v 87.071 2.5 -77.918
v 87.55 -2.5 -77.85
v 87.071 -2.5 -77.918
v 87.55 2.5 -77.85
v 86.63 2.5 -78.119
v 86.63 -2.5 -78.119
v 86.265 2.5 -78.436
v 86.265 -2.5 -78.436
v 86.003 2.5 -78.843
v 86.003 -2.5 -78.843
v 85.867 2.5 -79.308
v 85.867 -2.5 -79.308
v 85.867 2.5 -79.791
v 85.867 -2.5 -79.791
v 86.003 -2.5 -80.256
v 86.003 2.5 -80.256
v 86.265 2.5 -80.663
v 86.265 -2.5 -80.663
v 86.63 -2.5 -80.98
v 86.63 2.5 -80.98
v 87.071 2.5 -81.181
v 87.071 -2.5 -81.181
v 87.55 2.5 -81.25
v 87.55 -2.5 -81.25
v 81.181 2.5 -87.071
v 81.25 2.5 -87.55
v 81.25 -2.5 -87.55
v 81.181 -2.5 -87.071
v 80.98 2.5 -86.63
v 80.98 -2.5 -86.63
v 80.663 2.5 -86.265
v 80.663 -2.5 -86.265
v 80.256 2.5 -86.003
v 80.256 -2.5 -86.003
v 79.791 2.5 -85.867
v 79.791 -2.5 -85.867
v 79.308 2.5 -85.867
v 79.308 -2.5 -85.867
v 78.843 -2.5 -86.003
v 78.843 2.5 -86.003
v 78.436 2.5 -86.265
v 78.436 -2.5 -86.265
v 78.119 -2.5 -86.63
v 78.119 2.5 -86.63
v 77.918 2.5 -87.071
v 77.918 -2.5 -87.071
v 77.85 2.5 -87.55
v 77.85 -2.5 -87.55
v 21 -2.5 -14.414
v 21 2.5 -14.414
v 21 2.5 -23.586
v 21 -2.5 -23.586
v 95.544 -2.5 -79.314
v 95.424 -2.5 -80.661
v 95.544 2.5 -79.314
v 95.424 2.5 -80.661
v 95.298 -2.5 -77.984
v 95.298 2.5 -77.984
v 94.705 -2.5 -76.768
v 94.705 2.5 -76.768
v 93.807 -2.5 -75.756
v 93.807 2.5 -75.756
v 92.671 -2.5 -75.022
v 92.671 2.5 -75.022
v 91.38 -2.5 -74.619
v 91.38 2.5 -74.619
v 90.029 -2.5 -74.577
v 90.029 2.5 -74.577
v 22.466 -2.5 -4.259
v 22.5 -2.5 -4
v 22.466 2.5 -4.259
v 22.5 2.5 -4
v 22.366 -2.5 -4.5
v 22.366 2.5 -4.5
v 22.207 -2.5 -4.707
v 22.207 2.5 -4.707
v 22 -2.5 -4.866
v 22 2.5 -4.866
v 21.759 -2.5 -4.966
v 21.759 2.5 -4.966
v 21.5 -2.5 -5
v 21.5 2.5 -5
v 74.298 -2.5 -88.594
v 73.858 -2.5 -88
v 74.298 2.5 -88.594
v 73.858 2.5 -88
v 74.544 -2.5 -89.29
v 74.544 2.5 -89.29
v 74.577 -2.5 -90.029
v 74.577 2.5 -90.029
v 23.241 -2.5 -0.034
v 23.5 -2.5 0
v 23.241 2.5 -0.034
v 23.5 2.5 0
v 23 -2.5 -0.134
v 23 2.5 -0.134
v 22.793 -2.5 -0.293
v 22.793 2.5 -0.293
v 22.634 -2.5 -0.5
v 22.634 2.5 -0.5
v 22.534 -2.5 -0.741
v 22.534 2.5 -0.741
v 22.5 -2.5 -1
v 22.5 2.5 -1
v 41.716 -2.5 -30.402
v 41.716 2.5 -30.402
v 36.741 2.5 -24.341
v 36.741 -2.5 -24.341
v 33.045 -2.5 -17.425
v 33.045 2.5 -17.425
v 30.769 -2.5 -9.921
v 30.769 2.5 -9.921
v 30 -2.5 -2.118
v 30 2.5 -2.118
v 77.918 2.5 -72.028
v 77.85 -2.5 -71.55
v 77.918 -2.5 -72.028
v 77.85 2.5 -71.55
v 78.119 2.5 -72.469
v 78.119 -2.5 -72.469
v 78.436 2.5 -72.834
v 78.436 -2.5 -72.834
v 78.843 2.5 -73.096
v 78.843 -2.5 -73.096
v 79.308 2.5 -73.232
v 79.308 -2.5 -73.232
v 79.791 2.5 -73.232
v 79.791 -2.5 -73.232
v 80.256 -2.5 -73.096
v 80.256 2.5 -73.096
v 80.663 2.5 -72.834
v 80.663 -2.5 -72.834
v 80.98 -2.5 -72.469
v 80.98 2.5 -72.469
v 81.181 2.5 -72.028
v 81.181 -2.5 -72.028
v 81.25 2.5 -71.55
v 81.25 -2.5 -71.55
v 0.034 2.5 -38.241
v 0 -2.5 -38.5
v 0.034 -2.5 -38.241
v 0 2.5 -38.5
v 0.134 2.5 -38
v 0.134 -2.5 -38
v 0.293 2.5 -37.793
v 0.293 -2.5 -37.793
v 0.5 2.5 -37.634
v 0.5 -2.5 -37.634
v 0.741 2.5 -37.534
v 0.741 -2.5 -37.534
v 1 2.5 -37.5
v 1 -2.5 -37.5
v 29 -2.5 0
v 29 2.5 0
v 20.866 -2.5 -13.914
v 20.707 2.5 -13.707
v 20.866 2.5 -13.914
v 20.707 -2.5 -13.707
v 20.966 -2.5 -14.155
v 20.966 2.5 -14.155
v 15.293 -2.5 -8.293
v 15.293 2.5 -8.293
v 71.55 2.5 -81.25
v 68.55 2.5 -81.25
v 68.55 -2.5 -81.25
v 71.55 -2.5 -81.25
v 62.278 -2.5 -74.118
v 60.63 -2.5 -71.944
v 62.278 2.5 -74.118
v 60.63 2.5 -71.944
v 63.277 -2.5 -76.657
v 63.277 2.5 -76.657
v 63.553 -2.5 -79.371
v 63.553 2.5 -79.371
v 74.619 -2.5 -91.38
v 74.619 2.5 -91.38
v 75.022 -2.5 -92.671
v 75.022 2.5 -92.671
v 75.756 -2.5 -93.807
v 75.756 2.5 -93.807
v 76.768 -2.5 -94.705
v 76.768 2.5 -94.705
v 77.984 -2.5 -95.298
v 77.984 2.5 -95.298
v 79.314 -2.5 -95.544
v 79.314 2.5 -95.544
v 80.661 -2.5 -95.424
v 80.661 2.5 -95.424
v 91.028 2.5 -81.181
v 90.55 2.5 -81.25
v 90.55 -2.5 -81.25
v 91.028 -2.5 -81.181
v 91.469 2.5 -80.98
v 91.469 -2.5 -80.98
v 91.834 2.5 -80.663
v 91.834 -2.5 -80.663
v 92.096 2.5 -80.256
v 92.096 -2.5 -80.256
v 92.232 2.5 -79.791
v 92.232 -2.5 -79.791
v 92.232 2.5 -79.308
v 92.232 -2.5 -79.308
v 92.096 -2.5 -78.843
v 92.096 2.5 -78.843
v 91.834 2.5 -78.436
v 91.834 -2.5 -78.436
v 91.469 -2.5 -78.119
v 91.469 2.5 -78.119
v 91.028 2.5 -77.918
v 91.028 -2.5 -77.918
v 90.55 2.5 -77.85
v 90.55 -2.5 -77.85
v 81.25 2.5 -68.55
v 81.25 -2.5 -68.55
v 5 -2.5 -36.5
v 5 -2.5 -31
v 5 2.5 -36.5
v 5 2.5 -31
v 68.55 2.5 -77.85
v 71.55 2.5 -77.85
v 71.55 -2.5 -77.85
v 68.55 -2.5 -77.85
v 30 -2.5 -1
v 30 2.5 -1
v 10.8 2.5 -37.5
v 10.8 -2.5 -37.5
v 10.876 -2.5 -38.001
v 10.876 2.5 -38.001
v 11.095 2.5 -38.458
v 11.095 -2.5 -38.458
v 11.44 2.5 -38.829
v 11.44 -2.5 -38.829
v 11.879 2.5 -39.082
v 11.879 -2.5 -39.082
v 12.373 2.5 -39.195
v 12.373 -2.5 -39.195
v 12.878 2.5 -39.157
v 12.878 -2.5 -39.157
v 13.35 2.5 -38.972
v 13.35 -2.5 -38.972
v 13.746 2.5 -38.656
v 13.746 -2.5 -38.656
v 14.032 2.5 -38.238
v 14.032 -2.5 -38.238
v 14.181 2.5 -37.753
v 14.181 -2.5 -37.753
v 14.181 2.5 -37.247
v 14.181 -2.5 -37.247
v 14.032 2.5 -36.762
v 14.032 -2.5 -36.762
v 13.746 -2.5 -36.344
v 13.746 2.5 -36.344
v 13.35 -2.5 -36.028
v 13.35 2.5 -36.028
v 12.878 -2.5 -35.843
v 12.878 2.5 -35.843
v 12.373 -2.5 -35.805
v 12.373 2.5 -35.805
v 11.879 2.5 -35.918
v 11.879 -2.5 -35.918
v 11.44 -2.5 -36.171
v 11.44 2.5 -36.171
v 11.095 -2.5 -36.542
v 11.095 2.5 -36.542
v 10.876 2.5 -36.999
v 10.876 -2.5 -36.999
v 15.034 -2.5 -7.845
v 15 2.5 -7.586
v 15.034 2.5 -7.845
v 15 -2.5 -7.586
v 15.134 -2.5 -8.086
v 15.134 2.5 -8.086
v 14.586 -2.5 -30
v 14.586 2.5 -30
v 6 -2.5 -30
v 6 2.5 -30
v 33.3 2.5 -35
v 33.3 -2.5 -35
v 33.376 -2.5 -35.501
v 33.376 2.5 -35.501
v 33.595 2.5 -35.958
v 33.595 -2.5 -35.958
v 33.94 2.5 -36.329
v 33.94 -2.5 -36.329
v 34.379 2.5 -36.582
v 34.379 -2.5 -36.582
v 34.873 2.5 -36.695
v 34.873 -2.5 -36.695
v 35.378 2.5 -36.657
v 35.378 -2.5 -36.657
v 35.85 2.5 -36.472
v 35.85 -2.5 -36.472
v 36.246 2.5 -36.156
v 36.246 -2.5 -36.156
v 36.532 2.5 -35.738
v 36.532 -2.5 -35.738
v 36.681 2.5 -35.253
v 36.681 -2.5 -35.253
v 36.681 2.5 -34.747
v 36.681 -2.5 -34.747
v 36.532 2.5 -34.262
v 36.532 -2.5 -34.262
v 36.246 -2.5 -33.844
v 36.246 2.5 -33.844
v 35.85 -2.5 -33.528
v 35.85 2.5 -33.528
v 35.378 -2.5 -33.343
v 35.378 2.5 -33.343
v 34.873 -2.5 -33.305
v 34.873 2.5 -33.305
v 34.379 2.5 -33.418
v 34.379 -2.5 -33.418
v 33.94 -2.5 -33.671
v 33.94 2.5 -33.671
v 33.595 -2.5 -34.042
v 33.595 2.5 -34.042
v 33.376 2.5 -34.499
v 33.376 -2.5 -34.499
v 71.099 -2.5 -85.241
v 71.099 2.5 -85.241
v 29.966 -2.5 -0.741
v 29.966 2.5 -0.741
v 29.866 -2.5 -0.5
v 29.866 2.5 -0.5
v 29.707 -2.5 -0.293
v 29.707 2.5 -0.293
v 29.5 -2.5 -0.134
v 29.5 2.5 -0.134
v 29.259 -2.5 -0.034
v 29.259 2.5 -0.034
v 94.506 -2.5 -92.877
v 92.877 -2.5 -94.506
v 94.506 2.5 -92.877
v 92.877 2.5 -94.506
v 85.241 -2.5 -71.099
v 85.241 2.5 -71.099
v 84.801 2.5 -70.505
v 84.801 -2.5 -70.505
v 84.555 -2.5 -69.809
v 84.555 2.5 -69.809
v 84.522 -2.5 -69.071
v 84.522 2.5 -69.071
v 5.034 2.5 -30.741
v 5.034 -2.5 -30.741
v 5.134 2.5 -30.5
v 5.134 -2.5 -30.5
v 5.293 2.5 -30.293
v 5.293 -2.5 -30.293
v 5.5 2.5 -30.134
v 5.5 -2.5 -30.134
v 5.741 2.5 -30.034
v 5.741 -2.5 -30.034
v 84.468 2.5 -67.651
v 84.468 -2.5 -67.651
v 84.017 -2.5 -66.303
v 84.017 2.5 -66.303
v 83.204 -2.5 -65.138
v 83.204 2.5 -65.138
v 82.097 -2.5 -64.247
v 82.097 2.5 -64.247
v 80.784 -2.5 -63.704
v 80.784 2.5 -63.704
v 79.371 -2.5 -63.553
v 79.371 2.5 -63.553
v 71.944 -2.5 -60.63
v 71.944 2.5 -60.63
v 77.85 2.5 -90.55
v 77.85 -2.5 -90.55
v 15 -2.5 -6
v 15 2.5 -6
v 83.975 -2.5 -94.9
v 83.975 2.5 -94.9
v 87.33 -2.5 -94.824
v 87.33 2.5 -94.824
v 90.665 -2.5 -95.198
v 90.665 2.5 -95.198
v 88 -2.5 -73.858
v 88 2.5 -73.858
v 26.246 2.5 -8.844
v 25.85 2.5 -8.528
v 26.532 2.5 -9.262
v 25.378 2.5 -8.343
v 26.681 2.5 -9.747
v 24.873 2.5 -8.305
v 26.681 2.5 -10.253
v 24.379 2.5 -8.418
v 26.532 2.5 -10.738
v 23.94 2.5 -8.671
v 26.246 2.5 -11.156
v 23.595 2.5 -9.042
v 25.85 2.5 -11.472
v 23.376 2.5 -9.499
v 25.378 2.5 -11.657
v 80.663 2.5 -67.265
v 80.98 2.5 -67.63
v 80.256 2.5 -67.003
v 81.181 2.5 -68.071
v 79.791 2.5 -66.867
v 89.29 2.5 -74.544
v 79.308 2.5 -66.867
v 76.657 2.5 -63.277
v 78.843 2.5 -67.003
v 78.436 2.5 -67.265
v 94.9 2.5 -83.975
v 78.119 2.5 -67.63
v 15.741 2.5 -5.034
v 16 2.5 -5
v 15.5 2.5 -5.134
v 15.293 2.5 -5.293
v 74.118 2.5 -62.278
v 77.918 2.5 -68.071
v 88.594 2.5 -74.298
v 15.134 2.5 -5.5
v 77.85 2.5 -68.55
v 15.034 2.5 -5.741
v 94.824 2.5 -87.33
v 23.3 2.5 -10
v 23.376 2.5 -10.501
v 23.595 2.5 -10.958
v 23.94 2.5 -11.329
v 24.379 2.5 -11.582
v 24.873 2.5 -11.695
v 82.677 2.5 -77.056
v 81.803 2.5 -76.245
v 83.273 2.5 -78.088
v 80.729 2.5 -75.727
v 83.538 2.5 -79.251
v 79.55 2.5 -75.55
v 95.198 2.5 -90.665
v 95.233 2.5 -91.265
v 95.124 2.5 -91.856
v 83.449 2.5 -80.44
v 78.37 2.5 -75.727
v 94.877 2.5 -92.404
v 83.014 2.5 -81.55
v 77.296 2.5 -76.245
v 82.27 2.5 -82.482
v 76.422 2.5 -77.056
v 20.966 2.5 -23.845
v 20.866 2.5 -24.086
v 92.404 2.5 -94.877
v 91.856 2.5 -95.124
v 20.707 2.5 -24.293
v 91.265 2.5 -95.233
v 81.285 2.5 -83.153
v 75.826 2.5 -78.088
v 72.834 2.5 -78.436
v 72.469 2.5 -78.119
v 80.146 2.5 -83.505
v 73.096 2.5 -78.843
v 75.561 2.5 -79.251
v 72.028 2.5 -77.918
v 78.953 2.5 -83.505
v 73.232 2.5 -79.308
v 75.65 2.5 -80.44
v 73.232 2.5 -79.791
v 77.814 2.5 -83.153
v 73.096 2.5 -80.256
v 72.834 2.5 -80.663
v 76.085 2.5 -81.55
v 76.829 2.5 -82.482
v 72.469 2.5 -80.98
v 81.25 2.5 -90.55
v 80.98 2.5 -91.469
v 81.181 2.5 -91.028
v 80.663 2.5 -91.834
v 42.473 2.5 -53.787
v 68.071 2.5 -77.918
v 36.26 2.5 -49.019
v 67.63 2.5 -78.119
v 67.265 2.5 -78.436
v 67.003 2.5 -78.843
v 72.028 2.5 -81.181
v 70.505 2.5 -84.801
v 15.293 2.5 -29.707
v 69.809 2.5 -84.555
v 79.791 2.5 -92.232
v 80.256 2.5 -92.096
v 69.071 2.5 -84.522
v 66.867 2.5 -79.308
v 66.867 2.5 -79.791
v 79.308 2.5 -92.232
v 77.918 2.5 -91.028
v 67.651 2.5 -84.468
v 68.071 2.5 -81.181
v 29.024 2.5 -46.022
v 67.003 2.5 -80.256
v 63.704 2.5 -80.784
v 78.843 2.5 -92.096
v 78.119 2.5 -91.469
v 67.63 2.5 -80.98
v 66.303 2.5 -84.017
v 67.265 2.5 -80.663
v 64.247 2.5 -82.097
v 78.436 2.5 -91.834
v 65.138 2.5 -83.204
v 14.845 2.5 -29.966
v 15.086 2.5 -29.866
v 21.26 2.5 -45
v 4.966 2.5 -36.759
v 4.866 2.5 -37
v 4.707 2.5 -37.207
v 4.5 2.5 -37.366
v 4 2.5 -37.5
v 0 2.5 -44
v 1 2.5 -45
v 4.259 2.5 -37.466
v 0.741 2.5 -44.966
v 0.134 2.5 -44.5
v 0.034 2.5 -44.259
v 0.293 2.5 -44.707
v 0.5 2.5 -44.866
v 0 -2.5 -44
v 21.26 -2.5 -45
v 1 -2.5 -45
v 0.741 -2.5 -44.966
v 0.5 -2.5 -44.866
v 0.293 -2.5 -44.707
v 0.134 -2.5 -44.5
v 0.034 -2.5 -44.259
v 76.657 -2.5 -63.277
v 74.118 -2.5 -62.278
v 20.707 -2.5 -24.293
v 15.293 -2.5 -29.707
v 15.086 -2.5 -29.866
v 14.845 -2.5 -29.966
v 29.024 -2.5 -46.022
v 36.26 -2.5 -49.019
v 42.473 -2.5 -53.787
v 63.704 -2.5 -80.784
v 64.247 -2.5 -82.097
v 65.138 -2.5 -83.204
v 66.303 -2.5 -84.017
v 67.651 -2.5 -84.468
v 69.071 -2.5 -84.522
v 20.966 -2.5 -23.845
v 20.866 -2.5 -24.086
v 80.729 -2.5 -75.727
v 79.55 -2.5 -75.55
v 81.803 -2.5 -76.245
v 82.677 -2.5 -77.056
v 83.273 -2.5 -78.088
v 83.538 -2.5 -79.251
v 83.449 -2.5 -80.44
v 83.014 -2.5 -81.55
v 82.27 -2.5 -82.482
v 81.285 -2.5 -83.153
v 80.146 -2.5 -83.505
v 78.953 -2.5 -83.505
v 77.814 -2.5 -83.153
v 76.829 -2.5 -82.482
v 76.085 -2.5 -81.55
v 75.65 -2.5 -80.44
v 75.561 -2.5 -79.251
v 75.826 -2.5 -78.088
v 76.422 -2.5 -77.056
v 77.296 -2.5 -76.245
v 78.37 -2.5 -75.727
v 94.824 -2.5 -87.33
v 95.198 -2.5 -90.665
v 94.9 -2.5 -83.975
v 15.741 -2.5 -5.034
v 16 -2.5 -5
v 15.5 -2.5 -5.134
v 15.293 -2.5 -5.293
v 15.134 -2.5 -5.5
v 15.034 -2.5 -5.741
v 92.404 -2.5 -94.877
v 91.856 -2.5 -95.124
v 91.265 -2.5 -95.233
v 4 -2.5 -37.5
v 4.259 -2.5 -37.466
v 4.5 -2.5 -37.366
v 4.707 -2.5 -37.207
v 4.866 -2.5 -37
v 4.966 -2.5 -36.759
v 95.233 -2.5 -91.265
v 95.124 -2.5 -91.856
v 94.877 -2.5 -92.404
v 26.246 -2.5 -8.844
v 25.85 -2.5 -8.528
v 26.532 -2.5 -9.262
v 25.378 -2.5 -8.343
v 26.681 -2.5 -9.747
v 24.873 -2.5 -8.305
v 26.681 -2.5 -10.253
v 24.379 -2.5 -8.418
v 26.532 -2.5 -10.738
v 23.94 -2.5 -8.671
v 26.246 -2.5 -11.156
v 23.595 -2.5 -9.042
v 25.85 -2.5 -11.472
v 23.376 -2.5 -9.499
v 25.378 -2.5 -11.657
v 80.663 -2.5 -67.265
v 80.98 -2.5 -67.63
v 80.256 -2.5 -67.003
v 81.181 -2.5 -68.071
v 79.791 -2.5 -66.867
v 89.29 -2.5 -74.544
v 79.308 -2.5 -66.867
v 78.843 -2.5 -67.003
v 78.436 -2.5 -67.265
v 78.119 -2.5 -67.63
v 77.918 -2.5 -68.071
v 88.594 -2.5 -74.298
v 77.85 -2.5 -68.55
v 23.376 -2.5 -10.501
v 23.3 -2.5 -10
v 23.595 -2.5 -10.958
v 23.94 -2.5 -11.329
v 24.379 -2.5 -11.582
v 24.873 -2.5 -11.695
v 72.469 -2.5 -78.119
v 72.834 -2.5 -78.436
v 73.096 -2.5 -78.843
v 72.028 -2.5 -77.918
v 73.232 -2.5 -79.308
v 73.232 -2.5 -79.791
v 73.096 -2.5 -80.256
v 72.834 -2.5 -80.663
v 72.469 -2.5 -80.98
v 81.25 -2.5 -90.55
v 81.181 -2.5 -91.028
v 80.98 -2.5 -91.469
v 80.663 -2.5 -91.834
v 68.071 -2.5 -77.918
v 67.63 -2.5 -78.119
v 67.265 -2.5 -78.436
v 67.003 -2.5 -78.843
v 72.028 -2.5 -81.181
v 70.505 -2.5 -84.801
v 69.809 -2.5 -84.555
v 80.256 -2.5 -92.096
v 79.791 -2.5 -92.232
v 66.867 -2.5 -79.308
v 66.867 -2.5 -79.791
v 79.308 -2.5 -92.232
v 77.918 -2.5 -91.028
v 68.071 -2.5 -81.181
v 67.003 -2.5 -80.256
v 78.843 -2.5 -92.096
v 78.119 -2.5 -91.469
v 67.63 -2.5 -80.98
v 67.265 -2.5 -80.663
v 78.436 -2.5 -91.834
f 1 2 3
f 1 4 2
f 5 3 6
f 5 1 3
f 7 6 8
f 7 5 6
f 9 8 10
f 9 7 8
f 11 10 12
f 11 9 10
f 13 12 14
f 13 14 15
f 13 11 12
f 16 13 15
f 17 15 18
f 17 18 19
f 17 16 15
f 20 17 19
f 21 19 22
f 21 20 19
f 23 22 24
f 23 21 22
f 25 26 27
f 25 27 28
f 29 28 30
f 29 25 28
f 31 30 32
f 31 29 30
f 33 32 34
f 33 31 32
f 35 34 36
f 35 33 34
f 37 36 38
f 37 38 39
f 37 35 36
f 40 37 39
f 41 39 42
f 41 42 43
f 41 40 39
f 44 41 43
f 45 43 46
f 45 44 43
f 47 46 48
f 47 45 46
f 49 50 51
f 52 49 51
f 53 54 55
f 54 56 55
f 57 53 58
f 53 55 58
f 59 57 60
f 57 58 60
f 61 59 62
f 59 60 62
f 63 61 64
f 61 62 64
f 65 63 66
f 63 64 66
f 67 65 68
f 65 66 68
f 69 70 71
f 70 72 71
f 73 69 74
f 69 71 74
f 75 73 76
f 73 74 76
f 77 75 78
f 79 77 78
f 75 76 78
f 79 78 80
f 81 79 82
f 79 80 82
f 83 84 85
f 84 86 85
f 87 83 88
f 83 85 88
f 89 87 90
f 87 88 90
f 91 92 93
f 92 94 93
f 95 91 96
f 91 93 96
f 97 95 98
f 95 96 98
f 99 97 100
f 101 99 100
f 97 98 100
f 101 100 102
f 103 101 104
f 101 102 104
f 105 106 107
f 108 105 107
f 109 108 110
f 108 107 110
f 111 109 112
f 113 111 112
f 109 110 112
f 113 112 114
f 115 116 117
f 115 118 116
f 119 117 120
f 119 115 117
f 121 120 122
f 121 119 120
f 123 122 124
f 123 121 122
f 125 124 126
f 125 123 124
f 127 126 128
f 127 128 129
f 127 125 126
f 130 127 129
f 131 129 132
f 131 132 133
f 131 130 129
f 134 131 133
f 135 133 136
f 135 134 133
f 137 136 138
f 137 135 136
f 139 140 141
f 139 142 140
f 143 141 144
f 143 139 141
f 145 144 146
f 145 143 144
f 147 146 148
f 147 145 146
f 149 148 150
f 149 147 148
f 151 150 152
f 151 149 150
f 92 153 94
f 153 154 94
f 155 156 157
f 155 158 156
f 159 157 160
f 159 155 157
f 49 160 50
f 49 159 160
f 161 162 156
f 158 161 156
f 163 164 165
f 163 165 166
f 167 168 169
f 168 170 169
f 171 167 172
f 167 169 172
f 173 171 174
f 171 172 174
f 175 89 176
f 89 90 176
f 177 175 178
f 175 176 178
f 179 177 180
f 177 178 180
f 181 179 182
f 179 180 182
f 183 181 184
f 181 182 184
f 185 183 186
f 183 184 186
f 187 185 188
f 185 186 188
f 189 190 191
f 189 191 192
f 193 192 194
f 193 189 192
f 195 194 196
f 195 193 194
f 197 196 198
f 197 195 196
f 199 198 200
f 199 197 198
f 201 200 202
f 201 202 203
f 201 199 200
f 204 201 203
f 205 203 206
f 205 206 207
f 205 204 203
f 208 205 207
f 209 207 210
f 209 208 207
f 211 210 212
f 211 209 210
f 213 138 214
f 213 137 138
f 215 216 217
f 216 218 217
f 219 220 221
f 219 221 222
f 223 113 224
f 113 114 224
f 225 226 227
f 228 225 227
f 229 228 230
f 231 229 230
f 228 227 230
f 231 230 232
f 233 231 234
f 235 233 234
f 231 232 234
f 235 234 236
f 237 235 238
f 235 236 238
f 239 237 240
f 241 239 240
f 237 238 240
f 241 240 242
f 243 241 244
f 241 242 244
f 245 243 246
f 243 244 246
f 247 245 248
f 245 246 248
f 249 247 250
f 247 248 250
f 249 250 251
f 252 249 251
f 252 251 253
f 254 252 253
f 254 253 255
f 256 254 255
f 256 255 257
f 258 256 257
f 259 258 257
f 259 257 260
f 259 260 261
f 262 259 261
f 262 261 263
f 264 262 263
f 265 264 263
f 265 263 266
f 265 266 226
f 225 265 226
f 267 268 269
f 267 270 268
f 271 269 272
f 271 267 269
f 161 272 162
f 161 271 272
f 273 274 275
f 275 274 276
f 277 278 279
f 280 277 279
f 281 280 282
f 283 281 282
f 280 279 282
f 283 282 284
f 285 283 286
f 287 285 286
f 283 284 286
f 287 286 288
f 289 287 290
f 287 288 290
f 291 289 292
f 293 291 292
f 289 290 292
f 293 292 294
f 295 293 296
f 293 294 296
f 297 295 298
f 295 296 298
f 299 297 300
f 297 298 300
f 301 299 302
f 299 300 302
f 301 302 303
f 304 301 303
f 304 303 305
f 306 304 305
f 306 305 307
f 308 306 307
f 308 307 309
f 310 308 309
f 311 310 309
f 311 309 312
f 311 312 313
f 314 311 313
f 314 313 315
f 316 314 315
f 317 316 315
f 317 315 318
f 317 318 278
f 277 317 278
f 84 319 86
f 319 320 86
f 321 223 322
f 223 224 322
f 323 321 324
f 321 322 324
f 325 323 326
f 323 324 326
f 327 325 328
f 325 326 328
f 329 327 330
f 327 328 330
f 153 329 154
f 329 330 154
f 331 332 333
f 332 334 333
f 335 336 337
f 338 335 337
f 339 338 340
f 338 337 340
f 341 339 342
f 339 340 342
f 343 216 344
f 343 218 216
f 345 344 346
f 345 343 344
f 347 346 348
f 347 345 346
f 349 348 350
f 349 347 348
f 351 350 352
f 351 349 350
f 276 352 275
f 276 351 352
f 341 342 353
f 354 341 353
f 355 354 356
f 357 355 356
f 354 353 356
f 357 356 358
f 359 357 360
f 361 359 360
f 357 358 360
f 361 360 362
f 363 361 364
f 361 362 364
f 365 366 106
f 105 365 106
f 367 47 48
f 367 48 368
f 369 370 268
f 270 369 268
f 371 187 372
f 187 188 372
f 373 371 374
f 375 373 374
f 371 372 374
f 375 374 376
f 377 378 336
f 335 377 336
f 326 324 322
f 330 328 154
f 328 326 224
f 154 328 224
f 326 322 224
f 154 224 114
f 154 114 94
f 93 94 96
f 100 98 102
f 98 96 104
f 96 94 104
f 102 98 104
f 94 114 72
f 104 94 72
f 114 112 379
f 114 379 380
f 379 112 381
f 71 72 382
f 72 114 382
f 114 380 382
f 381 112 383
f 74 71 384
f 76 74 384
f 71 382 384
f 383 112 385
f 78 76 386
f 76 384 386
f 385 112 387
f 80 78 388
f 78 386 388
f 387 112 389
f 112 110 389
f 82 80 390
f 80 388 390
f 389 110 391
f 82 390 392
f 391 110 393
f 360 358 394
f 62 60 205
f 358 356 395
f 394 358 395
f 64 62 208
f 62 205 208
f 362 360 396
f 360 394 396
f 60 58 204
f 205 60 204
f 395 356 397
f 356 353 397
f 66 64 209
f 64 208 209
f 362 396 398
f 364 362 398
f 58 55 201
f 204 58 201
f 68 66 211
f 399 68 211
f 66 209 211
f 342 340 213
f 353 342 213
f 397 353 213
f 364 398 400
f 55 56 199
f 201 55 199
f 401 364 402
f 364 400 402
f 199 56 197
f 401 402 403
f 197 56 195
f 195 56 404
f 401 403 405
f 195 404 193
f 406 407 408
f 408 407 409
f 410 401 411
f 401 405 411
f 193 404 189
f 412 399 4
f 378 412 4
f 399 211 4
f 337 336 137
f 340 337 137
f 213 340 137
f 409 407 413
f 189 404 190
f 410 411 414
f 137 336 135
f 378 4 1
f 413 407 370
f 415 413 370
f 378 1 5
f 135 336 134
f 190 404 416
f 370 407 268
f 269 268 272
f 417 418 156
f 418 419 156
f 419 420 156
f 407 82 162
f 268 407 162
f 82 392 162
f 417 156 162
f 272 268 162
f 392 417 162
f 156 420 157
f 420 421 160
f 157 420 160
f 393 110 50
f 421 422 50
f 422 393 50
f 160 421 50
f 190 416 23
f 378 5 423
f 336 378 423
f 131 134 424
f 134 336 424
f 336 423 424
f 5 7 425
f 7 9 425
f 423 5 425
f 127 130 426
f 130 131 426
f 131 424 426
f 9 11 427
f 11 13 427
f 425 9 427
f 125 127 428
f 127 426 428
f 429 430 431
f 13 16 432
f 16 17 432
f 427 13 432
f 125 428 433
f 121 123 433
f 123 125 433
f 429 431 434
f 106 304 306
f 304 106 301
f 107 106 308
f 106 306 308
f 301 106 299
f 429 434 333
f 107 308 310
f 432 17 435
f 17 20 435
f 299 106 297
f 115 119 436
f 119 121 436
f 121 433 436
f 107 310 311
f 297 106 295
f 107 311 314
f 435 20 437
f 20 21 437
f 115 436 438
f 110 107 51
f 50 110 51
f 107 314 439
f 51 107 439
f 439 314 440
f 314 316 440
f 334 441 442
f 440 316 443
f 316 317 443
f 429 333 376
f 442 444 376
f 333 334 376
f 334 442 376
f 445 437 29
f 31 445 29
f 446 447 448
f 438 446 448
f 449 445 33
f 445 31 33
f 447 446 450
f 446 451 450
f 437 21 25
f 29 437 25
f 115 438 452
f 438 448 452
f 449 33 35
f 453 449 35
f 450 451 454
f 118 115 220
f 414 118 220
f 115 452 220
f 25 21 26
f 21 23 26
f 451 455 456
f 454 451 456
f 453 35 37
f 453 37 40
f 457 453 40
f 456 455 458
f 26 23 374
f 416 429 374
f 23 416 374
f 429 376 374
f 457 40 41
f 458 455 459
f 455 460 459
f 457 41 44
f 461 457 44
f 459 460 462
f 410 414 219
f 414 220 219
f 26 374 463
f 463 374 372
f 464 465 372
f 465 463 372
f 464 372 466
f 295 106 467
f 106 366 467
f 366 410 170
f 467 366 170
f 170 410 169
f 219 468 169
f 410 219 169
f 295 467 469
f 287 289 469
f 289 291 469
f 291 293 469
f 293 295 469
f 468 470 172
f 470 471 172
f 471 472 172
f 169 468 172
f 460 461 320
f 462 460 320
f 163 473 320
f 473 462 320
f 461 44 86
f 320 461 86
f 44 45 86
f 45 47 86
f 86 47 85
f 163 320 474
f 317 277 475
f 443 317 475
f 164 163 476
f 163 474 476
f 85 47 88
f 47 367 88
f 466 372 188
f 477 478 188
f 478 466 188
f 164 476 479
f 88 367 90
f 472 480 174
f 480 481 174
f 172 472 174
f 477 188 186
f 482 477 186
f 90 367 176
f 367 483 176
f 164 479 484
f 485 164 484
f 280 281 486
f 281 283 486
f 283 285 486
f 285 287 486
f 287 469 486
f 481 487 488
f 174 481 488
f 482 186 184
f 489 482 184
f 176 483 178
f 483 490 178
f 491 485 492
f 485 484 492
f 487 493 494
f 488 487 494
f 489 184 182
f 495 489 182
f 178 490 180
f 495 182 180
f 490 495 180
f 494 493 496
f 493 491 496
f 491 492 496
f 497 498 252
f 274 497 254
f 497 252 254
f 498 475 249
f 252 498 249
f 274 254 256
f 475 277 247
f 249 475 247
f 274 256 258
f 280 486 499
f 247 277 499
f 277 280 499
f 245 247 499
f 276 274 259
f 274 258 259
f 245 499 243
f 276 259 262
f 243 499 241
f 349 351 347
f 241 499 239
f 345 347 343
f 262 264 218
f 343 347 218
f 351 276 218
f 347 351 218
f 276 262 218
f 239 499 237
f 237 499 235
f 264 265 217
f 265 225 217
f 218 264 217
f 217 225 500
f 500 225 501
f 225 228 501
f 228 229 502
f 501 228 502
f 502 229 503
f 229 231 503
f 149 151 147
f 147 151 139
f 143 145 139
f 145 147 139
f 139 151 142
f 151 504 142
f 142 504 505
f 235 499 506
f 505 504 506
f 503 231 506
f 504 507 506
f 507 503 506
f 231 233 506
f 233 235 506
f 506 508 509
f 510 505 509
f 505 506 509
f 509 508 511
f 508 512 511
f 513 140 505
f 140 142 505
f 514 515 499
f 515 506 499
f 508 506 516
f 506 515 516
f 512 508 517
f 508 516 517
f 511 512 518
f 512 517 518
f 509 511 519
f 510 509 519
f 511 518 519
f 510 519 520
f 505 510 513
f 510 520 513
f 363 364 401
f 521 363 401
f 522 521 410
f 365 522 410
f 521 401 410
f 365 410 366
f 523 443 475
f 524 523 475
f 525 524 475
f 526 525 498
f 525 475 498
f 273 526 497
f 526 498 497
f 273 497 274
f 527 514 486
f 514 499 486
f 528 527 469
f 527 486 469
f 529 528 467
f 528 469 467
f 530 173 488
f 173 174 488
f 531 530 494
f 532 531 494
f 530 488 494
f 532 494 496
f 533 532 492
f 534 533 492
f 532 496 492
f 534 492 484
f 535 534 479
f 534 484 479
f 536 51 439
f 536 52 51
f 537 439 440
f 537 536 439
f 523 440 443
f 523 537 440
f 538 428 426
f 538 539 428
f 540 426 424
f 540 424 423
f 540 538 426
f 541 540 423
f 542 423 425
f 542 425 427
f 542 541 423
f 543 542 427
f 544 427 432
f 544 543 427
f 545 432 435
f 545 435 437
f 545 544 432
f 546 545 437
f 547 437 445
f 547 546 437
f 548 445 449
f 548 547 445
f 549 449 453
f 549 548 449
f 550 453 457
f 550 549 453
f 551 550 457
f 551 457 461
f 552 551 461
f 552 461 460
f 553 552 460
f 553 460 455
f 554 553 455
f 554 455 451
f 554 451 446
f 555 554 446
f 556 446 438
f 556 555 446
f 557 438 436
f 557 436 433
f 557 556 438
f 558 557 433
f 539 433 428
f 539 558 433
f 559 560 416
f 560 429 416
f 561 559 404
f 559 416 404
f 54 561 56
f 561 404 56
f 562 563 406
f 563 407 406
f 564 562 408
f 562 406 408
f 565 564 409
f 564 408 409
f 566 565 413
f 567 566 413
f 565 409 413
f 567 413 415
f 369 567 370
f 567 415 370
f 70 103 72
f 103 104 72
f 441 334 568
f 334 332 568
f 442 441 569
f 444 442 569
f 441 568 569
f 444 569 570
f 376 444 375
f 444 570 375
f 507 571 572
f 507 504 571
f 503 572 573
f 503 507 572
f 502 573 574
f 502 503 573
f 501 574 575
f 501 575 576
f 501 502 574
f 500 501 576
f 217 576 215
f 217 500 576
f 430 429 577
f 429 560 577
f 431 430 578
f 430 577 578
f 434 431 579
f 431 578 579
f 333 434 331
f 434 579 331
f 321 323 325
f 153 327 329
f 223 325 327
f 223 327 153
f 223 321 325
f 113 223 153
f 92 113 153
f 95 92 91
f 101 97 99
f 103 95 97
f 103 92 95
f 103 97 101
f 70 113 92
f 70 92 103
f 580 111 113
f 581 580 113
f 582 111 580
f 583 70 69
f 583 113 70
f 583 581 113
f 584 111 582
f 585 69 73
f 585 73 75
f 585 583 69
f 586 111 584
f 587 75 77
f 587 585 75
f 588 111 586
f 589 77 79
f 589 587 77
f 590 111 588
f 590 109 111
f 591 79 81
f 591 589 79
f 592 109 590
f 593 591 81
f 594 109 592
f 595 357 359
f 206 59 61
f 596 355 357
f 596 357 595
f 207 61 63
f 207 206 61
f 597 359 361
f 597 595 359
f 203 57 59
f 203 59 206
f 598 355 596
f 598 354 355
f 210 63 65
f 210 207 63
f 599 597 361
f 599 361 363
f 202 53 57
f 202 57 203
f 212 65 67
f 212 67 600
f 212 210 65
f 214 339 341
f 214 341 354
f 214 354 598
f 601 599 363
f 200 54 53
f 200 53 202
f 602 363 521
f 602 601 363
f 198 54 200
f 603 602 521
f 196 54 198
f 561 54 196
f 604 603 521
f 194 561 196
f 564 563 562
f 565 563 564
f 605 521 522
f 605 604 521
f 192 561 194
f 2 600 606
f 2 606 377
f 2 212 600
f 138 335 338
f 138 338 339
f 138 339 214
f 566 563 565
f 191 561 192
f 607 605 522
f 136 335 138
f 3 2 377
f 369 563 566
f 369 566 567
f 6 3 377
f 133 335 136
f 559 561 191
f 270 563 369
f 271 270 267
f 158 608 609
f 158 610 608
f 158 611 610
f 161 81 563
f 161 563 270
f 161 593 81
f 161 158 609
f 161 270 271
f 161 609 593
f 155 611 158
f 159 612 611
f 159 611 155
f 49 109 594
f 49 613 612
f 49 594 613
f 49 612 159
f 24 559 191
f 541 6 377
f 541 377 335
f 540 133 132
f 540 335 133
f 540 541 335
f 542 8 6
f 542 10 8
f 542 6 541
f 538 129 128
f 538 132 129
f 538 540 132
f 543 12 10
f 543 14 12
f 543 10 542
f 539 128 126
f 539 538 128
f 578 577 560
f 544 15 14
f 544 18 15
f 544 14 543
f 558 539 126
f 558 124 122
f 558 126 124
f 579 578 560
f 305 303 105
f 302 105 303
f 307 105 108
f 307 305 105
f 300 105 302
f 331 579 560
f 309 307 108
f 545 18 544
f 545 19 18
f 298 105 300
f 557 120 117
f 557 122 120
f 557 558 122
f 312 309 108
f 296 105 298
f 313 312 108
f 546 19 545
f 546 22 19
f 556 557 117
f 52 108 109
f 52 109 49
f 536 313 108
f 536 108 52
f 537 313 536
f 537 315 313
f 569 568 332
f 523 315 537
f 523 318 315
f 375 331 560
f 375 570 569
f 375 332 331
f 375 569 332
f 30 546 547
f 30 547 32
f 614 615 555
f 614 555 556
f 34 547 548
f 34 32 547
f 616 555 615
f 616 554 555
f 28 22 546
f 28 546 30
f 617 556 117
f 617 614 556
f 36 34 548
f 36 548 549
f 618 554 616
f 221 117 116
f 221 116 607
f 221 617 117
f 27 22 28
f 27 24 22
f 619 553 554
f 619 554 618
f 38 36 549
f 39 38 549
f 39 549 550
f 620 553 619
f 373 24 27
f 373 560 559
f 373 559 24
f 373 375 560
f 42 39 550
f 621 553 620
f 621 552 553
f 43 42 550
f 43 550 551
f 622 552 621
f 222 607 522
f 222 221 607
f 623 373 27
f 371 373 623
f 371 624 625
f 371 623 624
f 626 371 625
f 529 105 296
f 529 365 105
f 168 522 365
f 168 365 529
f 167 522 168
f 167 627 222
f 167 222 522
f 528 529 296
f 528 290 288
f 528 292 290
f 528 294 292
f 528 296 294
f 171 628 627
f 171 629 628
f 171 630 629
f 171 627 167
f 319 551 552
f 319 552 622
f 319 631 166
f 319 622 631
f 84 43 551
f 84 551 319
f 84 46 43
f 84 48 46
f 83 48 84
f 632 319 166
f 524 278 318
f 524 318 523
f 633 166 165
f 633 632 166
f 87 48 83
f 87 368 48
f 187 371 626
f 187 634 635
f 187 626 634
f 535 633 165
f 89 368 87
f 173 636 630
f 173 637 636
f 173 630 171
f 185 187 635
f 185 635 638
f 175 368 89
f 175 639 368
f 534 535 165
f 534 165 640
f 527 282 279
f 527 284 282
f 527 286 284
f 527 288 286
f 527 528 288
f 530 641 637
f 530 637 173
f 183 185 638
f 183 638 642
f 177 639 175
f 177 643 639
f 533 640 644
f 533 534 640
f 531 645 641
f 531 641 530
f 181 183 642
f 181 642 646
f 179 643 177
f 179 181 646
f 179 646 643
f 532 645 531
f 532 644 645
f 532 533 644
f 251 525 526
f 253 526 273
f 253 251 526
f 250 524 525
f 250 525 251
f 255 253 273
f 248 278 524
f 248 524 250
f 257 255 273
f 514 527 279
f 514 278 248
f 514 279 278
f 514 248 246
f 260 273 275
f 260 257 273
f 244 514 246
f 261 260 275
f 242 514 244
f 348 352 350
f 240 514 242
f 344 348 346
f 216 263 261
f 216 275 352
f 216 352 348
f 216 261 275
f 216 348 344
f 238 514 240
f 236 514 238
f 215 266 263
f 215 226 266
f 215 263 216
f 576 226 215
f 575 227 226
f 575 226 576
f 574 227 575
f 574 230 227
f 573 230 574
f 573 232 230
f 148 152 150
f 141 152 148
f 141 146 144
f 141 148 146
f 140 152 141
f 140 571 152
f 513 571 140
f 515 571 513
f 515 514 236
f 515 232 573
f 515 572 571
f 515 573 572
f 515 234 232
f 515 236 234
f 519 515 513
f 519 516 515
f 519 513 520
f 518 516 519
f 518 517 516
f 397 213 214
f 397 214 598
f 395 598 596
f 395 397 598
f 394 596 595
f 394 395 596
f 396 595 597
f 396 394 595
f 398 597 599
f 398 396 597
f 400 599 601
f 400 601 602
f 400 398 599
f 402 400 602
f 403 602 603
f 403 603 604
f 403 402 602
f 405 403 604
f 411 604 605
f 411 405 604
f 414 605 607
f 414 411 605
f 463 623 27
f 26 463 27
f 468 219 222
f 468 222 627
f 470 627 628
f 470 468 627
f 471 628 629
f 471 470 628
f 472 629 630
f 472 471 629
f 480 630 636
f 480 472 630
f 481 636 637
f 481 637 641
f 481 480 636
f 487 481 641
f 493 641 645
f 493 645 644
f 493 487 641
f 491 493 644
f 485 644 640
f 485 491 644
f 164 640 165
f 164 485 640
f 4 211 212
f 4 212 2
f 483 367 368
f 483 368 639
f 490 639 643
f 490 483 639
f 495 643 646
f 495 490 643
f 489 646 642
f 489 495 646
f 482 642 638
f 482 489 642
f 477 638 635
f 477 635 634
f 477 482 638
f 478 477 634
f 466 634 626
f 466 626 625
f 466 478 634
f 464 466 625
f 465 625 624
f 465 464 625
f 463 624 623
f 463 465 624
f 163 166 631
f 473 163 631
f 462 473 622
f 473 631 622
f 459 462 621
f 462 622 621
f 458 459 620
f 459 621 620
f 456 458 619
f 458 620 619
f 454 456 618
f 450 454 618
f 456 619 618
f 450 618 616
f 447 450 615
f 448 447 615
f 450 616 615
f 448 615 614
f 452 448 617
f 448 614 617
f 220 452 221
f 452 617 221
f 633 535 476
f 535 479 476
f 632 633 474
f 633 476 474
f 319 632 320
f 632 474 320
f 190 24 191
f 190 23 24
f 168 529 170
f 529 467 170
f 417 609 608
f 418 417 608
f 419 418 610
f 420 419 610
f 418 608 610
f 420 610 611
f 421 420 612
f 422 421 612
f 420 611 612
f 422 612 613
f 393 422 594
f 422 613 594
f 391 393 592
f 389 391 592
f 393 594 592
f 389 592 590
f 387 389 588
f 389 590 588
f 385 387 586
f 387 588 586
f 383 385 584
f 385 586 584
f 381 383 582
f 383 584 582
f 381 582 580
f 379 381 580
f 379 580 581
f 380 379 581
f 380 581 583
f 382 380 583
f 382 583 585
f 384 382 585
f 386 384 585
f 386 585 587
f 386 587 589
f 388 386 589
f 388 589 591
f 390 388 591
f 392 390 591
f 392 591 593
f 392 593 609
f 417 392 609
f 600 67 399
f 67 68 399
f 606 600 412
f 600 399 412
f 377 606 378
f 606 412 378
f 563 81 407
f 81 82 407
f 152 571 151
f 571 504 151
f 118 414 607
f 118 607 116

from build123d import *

# Parameters (mm, degrees)
SKETCH1_R            = 4
BOSS_EXTRUDE1_DEPTH  = 2.5
CUT_EXTRUDE1_DEPTH   = 10
FILLET1_R            = 2.5
FILLET2_R            = 1
M3_CLEARANCE_HOLE1_D = 3.4
M3_CLEARANCE_HOLE2_D = 3.4


with BuildPart() as part:
    # Sketch1 → Boss-Extrude1 (new, symmetric)
    with BuildSketch(Plane(origin=(0, 0, 0), x_dir=(1, 0, 0), z_dir=(0, 1, 0))):
        with BuildLine():
            Line((0, 37.5), (0, 45))
            Line((0, 45), (21.25988463, 45))
            ThreePointArc((21.25988463, 45), (32.740387601, 47.283614025), (42.473088065, 53.786796564))
            Line((42.473088065, 53.786796564), (60.630111199, 71.943819698))
            ThreePointArc((60.630111199, 71.943819698), (62.864579349, 75.353330401), (63.552689718, 79.371304426))
            ThreePointArc((63.552689718, 79.371304426), (65.137560566, 83.204452196), (69.070514812, 84.522294498))
            ThreePointArc((69.070514812, 84.522294498), (70.16592161, 84.652219255), (71.098782729, 85.240918353))
            Line((71.098782729, 85.240918353), (73.858107414, 88.000243038))
            ThreePointArc((73.858107414, 88.000243038), (74.446806512, 88.933104157), (74.576731268, 90.028510955))
            ThreePointArc((74.576731268, 90.028510955), (76.231825981, 94.29022854), (80.660715996, 95.424472129))
            ThreePointArc((80.660715996, 95.424472129), (86.294292266, 94.799388668), (91.923881554, 95.45941546))
            Line((91.923881554, 95.45941546), (95.45941546, 91.923881554))
            ThreePointArc((95.45941546, 91.923881554), (94.799388668, 86.294292266), (95.424472129, 80.660715996))
            ThreePointArc((95.424472129, 80.660715996), (94.29022854, 76.231825981), (90.028510955, 74.576731268))
            ThreePointArc((90.028510955, 74.576731268), (88.933104157, 74.446806512), (88.000243038, 73.858107414))
            Line((88.000243038, 73.858107414), (85.240918353, 71.098782729))
            ThreePointArc((85.240918353, 71.098782729), (84.652219255, 70.16592161), (84.522294498, 69.070514812))
            ThreePointArc((84.522294498, 69.070514812), (83.204452196, 65.137560566), (79.371304426, 63.552689718))
            ThreePointArc((79.371304426, 63.552689718), (75.353330401, 62.864579349), (71.943819698, 60.630111199))
            Line((71.943819698, 60.630111199), (41.715728753, 30.402020254))
            ThreePointArc((41.715728753, 30.402020254), (33.0448187, 17.425086301), (30, 2.117749006))
            Line((30, 2.117749006), (30, 0))
            Line((30, 0), (22.5, 0))
            Line((22.5, 0), (22.5, 5))
            Line((22.5, 5), (15, 5))
            Line((15, 5), (15, 30))
            Line((15, 30), (5, 30))
            Line((5, 30), (5, 37.5))
            Line((5, 37.5), (0, 37.5))
        make_face()
        with Locations(Location((79.549512883, 79.549512883, 0), (0, 0, 270))):
            Circle(SKETCH1_R, mode=Mode.SUBTRACT)
        with BuildLine():
            Line((77.849512883, 87.549512883), (77.849512883, 90.549512883))
            ThreePointArc((77.849512883, 90.549512883), (79.549512883, 92.249512883), (81.249512883, 90.549512883))
            Line((81.249512883, 90.549512883), (81.249512883, 87.549512883))
            ThreePointArc((81.249512883, 87.549512883), (79.549512883, 85.849512883), (77.849512883, 87.549512883))
        make_face(mode=Mode.SUBTRACT)
        with BuildLine():
            Line((87.549512883, 81.249512883), (90.549512883, 81.249512883))
            ThreePointArc((90.549512883, 81.249512883), (92.249512883, 79.549512883), (90.549512883, 77.849512883))
            Line((90.549512883, 77.849512883), (87.549512883, 77.849512883))
            ThreePointArc((87.549512883, 77.849512883), (85.849512883, 79.549512883), (87.549512883, 81.249512883))
        make_face(mode=Mode.SUBTRACT)
        with BuildLine():
            Line((81.249512883, 71.549512883), (81.249512883, 68.549512883))
            ThreePointArc((81.249512883, 68.549512883), (79.549512883, 66.849512883), (77.849512883, 68.549512883))
            Line((77.849512883, 68.549512883), (77.849512883, 71.549512883))
            ThreePointArc((77.849512883, 71.549512883), (79.549512883, 73.249512883), (81.249512883, 71.549512883))
        make_face(mode=Mode.SUBTRACT)
        with BuildLine():
            Line((71.549512883, 77.849512883), (68.549512883, 77.849512883))
            ThreePointArc((68.549512883, 77.849512883), (66.849512883, 79.549512883), (68.549512883, 81.249512883))
            Line((68.549512883, 81.249512883), (71.549512883, 81.249512883))
            ThreePointArc((71.549512883, 81.249512883), (73.249512883, 79.549512883), (71.549512883, 77.849512883))
        make_face(mode=Mode.SUBTRACT)
    extrude(amount=BOSS_EXTRUDE1_DEPTH, both=True)

    # Sketch2 → Cut-Extrude1 (cut)
    with BuildSketch(Plane(origin=(0, 2.5, 0), x_dir=(1, 0, 0), z_dir=(0, 1, 0))):
        Polygon((21, 24), (15, 30), (15, 8), (21, 14), align=None)
    extrude(amount=-CUT_EXTRUDE1_DEPTH, mode=Mode.SUBTRACT)

    # Fillet1
    fillet1_edges = [part.edges().sort_by_distance(p)[0] for p in [
        (91.923881554, 0, -95.45941546),
        (95.45941546, 0, -91.923881554),
    ]]
    fillet(fillet1_edges, radius=FILLET1_R)

    # Fillet2
    fillet2_edges = [part.edges().sort_by_distance(p)[0] for p in [
        (21, 0, -14),
        (15, 0, -8),
        (21, 0, -24),
        (30, 0, 0),
        (22.5, 0, 0),
        (22.5, 0, -5),
        (15, 0, -5),
        (15, 0, -30),
        (5, 0, -30),
        (5, 0, -37.5),
        (0, 0, -37.5),
        (0, 0, -45),
    ]]
    fillet(fillet2_edges, radius=FILLET2_R)

    # M3 Clearance Hole1 (through all)
    with Locations(Plane(origin=(0, 2.5, 0), x_dir=(1, 0, 0), z_dir=(0, 1, 0))):
        with Locations((35, 35)):
            Hole(M3_CLEARANCE_HOLE1_D / 2)

    # M3 Clearance Hole2 (through all)
    with Locations(Plane(origin=(0, 2.5, 0), x_dir=(1, 0, 0), z_dir=(0, 1, 0))):
        with Locations((12.5, 37.5), (25, 10)):
            Hole(M3_CLEARANCE_HOLE2_D / 2)


solid = part.part
